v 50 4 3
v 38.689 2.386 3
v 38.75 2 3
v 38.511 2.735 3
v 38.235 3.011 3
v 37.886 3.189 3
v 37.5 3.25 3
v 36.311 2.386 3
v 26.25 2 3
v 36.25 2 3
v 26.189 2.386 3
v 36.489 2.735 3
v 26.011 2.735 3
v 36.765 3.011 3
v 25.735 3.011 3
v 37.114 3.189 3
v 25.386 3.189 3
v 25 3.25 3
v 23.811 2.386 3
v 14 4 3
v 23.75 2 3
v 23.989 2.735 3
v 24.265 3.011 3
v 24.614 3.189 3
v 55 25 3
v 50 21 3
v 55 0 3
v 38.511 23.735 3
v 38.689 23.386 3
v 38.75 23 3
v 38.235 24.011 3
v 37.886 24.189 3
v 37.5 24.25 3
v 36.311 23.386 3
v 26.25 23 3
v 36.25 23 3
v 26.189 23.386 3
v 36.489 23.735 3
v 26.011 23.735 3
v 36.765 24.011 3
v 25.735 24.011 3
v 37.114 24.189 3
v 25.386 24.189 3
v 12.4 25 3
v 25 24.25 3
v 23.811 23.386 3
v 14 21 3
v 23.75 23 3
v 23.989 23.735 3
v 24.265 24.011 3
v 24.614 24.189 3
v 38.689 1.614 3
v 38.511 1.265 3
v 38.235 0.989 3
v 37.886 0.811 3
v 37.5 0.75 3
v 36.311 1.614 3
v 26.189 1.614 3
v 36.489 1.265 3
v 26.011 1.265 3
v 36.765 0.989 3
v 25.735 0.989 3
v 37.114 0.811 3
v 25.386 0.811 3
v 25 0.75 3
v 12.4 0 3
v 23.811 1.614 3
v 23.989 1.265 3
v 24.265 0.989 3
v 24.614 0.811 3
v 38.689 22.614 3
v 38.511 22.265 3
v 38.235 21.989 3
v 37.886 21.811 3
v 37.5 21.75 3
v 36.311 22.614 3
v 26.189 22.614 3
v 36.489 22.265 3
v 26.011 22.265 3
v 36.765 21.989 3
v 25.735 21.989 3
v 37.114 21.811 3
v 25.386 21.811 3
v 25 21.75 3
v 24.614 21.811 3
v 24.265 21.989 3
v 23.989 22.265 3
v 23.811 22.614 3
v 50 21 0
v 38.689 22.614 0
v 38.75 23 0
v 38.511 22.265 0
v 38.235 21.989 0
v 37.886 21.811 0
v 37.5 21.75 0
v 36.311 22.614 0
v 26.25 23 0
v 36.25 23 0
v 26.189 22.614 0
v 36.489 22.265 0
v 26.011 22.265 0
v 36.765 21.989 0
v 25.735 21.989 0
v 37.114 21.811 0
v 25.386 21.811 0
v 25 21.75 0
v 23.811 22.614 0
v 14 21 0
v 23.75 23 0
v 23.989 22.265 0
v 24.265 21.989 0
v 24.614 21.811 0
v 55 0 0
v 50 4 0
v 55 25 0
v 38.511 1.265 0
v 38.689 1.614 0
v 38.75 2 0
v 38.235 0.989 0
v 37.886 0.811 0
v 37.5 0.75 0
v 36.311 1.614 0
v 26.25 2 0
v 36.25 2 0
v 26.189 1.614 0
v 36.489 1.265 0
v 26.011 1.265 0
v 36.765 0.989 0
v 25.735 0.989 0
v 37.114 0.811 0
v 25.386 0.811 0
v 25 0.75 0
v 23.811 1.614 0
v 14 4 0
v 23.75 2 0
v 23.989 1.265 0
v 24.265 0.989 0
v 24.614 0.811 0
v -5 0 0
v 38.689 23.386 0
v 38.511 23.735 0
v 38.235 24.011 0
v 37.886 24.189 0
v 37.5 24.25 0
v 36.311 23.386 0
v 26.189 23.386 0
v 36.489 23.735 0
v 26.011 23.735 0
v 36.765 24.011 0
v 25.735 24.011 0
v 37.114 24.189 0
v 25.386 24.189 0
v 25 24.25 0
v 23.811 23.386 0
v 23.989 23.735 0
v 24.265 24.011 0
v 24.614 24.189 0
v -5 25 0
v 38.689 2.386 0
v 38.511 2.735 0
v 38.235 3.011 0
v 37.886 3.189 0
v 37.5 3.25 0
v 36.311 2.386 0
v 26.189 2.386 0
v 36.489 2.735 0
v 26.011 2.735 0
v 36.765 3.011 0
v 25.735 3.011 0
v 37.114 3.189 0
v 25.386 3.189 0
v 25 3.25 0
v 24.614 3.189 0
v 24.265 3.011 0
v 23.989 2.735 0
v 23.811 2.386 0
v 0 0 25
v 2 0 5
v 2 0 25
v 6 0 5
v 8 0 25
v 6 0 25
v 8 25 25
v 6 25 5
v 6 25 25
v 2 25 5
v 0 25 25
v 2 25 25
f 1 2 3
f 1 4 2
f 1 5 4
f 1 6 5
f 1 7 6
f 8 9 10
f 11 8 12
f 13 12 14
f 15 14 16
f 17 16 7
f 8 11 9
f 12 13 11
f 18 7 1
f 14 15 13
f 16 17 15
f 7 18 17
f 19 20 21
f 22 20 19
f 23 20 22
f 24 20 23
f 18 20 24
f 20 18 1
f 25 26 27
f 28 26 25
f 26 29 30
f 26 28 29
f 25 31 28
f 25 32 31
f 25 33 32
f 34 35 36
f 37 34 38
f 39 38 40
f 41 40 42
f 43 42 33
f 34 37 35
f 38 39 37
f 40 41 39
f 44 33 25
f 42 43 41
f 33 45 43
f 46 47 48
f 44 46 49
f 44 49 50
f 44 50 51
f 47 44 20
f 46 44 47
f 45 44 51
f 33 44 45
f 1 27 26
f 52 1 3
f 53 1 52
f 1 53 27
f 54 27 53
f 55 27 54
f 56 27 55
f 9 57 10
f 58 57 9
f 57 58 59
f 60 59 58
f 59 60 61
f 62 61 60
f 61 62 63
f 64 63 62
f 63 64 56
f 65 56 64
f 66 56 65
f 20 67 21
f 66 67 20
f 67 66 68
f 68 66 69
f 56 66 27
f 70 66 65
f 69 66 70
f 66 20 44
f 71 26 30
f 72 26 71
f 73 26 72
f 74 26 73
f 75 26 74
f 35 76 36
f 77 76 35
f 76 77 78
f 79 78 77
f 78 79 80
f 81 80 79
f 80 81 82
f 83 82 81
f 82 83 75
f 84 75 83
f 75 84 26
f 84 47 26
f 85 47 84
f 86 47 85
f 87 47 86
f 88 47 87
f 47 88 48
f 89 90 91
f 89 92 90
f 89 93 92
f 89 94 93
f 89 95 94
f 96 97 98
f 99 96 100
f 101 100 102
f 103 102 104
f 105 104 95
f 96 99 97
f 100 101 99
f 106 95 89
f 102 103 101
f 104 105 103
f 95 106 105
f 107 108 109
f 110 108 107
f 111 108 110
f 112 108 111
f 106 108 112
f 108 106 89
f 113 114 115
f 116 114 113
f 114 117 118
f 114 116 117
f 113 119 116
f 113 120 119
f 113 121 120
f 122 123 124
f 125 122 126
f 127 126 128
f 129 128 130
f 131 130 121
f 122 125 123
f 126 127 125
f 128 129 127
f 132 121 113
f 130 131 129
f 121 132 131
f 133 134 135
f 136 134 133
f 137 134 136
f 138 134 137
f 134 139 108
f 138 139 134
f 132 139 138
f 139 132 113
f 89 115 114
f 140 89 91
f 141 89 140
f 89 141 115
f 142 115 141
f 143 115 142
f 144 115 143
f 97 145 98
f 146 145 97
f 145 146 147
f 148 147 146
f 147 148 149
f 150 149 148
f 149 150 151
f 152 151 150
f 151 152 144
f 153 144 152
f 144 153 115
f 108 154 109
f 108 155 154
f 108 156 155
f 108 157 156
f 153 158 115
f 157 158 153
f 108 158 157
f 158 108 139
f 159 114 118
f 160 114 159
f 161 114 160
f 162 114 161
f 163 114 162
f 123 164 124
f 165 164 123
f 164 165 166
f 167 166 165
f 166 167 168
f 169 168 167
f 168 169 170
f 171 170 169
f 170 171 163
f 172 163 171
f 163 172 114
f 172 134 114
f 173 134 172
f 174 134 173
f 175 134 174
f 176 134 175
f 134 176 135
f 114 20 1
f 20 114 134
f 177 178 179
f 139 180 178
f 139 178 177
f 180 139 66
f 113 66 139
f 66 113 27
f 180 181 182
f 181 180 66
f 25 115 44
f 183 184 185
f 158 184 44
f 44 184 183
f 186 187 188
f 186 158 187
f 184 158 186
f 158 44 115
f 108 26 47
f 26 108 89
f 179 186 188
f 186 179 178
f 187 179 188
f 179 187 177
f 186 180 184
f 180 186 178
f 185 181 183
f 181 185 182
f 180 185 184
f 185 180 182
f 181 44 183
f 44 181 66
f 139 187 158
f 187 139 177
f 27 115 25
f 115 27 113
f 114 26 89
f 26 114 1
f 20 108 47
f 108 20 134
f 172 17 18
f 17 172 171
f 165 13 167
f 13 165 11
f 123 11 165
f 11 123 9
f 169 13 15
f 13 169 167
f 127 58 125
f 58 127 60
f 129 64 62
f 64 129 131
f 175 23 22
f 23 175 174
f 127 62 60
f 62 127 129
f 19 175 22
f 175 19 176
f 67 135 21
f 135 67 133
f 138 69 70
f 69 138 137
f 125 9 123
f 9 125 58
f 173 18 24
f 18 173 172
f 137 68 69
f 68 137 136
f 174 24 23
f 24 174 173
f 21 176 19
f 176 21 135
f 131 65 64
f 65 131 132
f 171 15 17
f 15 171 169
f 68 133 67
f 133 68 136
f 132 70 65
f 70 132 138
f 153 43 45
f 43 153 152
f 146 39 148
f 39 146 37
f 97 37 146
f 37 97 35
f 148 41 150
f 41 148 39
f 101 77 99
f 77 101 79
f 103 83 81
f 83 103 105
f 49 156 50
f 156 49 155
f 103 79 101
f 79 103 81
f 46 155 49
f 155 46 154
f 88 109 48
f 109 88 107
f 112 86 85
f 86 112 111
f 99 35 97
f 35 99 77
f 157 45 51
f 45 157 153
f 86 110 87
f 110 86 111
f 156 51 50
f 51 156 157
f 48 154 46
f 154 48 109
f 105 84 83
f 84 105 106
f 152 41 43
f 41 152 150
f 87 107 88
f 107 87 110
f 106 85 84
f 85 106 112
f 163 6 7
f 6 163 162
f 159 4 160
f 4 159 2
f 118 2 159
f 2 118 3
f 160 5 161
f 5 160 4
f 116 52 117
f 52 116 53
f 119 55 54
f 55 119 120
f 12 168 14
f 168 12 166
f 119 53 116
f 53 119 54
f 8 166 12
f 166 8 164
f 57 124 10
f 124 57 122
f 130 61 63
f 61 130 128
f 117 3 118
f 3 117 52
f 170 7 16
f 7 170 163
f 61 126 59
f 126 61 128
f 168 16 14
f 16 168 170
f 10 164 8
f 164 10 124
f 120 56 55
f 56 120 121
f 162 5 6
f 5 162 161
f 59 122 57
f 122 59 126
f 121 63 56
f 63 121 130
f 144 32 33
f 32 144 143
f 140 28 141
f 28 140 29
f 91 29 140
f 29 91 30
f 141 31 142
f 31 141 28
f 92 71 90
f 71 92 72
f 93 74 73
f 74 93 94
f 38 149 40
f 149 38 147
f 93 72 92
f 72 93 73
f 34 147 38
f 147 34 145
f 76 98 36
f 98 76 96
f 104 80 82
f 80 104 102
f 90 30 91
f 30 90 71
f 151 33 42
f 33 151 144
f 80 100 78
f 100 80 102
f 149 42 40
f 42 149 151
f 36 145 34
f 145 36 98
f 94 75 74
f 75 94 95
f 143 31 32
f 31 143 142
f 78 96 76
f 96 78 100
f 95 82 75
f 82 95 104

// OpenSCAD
// Mount for Raspberry Pi Camera Module

// Camera Mounting Bracket
module camera_mount() {
    difference() {
        union() {
            
           /*
            // Camera Struts
            translate([8,0,0])
                cube([62,4,3]);
            
            translate([8,21,0])
                cube([62,4,3]);
            */
           
           translate([8,0,0])
                cube([45,4,3]);
            
            translate([8,21,0])
                cube([45,4,3]);
           
            /*
            // Lower Anchor slot
            translate([72,0,0])
                cube([2,25,25]);
            
            translate([72,0,0])
                cube([6,25,2]);
            
            translate([78,0,0])
                cube([2,25,25]);
            */
           
            // Upper Anchor slot
            translate([0,0,0])
                cube([2,25,25]);
            
            translate([2,0,0])
                cube([6,25,5]);
            
            translate([6,0,0])
                cube([2,25,25]);
            
           
           
            // Lower Support Wedges
            /*
            translate([70,4,0])
                rotate([0,-90,90])
                    linear_extrude(height = 4, center = false, convexity = 10, twist = 0)
                    polygon(
                    points=[ [0,0],[0,25],[25,0] ],
                    paths= [ [0,1,2] ]
                    );
            
            translate([70,25,0])
                rotate([0,-90,90])
                    linear_extrude(height = 4, center = false, convexity = 10, twist = 0)
                    polygon(
                    points=[ [0,0],[0,25],[25,0] ],
                    paths= [ [0,1,2] ]
                    );
            
            translate([73,25,0])
                rotate([0,-90,90])
                    linear_extrude(height = 25, center = false, convexity = 10, twist = 0)
                    polygon(
                    points=[ [0,0],[0,10],[10,0] ],
                    paths= [ [0,1,2] ]
                    );*/
            
            // Upper support wedge
            translate([8,0,25])
                rotate([-90,0,0])
                    linear_extrude(height = 25, center = false, convexity = 10, twist = 0)
                        polygon(
                            points=[ [0,0],[0,25],[5,25] ],
                            paths=[ [0,1,2] ]
                        );

            // Opposite Upper support wedge
            translate([0,25,25])
                rotate([-90,0,180])
                    linear_extrude(height = 25, center = false, convexity = 10, twist = 0)
                        polygon(
                            points=[ [0,0],[0,25],[5,25] ],
                            paths=[ [0,1,2] ]
                        );
                  
            // Lower Cross-beam        
            translate([50,0,0])
                cube([5,25,3]);            
            
            
            // Upper Cross-beam        
            translate([7,0,0])
                cube([7,25,3]);
        }
        
        // Screw holes
        translate([25,2,-5])
            rotate([0,0,0])
                cylinder(h=10, d=2.5, $fn=20);
        
        translate([25,23,-5])
            rotate([0,0,0])
                cylinder(h=10, d=2.5, $fn=20);
        
        translate([37.5,2,-5])
            rotate([0,0,0])
                cylinder(h=10, d=2.5, $fn=20);
        
        translate([37.5,23,-5])
            rotate([0,0,0])
                cylinder(h=10, d=2.5, $fn=20);
    }
    
}

camera_mount();
